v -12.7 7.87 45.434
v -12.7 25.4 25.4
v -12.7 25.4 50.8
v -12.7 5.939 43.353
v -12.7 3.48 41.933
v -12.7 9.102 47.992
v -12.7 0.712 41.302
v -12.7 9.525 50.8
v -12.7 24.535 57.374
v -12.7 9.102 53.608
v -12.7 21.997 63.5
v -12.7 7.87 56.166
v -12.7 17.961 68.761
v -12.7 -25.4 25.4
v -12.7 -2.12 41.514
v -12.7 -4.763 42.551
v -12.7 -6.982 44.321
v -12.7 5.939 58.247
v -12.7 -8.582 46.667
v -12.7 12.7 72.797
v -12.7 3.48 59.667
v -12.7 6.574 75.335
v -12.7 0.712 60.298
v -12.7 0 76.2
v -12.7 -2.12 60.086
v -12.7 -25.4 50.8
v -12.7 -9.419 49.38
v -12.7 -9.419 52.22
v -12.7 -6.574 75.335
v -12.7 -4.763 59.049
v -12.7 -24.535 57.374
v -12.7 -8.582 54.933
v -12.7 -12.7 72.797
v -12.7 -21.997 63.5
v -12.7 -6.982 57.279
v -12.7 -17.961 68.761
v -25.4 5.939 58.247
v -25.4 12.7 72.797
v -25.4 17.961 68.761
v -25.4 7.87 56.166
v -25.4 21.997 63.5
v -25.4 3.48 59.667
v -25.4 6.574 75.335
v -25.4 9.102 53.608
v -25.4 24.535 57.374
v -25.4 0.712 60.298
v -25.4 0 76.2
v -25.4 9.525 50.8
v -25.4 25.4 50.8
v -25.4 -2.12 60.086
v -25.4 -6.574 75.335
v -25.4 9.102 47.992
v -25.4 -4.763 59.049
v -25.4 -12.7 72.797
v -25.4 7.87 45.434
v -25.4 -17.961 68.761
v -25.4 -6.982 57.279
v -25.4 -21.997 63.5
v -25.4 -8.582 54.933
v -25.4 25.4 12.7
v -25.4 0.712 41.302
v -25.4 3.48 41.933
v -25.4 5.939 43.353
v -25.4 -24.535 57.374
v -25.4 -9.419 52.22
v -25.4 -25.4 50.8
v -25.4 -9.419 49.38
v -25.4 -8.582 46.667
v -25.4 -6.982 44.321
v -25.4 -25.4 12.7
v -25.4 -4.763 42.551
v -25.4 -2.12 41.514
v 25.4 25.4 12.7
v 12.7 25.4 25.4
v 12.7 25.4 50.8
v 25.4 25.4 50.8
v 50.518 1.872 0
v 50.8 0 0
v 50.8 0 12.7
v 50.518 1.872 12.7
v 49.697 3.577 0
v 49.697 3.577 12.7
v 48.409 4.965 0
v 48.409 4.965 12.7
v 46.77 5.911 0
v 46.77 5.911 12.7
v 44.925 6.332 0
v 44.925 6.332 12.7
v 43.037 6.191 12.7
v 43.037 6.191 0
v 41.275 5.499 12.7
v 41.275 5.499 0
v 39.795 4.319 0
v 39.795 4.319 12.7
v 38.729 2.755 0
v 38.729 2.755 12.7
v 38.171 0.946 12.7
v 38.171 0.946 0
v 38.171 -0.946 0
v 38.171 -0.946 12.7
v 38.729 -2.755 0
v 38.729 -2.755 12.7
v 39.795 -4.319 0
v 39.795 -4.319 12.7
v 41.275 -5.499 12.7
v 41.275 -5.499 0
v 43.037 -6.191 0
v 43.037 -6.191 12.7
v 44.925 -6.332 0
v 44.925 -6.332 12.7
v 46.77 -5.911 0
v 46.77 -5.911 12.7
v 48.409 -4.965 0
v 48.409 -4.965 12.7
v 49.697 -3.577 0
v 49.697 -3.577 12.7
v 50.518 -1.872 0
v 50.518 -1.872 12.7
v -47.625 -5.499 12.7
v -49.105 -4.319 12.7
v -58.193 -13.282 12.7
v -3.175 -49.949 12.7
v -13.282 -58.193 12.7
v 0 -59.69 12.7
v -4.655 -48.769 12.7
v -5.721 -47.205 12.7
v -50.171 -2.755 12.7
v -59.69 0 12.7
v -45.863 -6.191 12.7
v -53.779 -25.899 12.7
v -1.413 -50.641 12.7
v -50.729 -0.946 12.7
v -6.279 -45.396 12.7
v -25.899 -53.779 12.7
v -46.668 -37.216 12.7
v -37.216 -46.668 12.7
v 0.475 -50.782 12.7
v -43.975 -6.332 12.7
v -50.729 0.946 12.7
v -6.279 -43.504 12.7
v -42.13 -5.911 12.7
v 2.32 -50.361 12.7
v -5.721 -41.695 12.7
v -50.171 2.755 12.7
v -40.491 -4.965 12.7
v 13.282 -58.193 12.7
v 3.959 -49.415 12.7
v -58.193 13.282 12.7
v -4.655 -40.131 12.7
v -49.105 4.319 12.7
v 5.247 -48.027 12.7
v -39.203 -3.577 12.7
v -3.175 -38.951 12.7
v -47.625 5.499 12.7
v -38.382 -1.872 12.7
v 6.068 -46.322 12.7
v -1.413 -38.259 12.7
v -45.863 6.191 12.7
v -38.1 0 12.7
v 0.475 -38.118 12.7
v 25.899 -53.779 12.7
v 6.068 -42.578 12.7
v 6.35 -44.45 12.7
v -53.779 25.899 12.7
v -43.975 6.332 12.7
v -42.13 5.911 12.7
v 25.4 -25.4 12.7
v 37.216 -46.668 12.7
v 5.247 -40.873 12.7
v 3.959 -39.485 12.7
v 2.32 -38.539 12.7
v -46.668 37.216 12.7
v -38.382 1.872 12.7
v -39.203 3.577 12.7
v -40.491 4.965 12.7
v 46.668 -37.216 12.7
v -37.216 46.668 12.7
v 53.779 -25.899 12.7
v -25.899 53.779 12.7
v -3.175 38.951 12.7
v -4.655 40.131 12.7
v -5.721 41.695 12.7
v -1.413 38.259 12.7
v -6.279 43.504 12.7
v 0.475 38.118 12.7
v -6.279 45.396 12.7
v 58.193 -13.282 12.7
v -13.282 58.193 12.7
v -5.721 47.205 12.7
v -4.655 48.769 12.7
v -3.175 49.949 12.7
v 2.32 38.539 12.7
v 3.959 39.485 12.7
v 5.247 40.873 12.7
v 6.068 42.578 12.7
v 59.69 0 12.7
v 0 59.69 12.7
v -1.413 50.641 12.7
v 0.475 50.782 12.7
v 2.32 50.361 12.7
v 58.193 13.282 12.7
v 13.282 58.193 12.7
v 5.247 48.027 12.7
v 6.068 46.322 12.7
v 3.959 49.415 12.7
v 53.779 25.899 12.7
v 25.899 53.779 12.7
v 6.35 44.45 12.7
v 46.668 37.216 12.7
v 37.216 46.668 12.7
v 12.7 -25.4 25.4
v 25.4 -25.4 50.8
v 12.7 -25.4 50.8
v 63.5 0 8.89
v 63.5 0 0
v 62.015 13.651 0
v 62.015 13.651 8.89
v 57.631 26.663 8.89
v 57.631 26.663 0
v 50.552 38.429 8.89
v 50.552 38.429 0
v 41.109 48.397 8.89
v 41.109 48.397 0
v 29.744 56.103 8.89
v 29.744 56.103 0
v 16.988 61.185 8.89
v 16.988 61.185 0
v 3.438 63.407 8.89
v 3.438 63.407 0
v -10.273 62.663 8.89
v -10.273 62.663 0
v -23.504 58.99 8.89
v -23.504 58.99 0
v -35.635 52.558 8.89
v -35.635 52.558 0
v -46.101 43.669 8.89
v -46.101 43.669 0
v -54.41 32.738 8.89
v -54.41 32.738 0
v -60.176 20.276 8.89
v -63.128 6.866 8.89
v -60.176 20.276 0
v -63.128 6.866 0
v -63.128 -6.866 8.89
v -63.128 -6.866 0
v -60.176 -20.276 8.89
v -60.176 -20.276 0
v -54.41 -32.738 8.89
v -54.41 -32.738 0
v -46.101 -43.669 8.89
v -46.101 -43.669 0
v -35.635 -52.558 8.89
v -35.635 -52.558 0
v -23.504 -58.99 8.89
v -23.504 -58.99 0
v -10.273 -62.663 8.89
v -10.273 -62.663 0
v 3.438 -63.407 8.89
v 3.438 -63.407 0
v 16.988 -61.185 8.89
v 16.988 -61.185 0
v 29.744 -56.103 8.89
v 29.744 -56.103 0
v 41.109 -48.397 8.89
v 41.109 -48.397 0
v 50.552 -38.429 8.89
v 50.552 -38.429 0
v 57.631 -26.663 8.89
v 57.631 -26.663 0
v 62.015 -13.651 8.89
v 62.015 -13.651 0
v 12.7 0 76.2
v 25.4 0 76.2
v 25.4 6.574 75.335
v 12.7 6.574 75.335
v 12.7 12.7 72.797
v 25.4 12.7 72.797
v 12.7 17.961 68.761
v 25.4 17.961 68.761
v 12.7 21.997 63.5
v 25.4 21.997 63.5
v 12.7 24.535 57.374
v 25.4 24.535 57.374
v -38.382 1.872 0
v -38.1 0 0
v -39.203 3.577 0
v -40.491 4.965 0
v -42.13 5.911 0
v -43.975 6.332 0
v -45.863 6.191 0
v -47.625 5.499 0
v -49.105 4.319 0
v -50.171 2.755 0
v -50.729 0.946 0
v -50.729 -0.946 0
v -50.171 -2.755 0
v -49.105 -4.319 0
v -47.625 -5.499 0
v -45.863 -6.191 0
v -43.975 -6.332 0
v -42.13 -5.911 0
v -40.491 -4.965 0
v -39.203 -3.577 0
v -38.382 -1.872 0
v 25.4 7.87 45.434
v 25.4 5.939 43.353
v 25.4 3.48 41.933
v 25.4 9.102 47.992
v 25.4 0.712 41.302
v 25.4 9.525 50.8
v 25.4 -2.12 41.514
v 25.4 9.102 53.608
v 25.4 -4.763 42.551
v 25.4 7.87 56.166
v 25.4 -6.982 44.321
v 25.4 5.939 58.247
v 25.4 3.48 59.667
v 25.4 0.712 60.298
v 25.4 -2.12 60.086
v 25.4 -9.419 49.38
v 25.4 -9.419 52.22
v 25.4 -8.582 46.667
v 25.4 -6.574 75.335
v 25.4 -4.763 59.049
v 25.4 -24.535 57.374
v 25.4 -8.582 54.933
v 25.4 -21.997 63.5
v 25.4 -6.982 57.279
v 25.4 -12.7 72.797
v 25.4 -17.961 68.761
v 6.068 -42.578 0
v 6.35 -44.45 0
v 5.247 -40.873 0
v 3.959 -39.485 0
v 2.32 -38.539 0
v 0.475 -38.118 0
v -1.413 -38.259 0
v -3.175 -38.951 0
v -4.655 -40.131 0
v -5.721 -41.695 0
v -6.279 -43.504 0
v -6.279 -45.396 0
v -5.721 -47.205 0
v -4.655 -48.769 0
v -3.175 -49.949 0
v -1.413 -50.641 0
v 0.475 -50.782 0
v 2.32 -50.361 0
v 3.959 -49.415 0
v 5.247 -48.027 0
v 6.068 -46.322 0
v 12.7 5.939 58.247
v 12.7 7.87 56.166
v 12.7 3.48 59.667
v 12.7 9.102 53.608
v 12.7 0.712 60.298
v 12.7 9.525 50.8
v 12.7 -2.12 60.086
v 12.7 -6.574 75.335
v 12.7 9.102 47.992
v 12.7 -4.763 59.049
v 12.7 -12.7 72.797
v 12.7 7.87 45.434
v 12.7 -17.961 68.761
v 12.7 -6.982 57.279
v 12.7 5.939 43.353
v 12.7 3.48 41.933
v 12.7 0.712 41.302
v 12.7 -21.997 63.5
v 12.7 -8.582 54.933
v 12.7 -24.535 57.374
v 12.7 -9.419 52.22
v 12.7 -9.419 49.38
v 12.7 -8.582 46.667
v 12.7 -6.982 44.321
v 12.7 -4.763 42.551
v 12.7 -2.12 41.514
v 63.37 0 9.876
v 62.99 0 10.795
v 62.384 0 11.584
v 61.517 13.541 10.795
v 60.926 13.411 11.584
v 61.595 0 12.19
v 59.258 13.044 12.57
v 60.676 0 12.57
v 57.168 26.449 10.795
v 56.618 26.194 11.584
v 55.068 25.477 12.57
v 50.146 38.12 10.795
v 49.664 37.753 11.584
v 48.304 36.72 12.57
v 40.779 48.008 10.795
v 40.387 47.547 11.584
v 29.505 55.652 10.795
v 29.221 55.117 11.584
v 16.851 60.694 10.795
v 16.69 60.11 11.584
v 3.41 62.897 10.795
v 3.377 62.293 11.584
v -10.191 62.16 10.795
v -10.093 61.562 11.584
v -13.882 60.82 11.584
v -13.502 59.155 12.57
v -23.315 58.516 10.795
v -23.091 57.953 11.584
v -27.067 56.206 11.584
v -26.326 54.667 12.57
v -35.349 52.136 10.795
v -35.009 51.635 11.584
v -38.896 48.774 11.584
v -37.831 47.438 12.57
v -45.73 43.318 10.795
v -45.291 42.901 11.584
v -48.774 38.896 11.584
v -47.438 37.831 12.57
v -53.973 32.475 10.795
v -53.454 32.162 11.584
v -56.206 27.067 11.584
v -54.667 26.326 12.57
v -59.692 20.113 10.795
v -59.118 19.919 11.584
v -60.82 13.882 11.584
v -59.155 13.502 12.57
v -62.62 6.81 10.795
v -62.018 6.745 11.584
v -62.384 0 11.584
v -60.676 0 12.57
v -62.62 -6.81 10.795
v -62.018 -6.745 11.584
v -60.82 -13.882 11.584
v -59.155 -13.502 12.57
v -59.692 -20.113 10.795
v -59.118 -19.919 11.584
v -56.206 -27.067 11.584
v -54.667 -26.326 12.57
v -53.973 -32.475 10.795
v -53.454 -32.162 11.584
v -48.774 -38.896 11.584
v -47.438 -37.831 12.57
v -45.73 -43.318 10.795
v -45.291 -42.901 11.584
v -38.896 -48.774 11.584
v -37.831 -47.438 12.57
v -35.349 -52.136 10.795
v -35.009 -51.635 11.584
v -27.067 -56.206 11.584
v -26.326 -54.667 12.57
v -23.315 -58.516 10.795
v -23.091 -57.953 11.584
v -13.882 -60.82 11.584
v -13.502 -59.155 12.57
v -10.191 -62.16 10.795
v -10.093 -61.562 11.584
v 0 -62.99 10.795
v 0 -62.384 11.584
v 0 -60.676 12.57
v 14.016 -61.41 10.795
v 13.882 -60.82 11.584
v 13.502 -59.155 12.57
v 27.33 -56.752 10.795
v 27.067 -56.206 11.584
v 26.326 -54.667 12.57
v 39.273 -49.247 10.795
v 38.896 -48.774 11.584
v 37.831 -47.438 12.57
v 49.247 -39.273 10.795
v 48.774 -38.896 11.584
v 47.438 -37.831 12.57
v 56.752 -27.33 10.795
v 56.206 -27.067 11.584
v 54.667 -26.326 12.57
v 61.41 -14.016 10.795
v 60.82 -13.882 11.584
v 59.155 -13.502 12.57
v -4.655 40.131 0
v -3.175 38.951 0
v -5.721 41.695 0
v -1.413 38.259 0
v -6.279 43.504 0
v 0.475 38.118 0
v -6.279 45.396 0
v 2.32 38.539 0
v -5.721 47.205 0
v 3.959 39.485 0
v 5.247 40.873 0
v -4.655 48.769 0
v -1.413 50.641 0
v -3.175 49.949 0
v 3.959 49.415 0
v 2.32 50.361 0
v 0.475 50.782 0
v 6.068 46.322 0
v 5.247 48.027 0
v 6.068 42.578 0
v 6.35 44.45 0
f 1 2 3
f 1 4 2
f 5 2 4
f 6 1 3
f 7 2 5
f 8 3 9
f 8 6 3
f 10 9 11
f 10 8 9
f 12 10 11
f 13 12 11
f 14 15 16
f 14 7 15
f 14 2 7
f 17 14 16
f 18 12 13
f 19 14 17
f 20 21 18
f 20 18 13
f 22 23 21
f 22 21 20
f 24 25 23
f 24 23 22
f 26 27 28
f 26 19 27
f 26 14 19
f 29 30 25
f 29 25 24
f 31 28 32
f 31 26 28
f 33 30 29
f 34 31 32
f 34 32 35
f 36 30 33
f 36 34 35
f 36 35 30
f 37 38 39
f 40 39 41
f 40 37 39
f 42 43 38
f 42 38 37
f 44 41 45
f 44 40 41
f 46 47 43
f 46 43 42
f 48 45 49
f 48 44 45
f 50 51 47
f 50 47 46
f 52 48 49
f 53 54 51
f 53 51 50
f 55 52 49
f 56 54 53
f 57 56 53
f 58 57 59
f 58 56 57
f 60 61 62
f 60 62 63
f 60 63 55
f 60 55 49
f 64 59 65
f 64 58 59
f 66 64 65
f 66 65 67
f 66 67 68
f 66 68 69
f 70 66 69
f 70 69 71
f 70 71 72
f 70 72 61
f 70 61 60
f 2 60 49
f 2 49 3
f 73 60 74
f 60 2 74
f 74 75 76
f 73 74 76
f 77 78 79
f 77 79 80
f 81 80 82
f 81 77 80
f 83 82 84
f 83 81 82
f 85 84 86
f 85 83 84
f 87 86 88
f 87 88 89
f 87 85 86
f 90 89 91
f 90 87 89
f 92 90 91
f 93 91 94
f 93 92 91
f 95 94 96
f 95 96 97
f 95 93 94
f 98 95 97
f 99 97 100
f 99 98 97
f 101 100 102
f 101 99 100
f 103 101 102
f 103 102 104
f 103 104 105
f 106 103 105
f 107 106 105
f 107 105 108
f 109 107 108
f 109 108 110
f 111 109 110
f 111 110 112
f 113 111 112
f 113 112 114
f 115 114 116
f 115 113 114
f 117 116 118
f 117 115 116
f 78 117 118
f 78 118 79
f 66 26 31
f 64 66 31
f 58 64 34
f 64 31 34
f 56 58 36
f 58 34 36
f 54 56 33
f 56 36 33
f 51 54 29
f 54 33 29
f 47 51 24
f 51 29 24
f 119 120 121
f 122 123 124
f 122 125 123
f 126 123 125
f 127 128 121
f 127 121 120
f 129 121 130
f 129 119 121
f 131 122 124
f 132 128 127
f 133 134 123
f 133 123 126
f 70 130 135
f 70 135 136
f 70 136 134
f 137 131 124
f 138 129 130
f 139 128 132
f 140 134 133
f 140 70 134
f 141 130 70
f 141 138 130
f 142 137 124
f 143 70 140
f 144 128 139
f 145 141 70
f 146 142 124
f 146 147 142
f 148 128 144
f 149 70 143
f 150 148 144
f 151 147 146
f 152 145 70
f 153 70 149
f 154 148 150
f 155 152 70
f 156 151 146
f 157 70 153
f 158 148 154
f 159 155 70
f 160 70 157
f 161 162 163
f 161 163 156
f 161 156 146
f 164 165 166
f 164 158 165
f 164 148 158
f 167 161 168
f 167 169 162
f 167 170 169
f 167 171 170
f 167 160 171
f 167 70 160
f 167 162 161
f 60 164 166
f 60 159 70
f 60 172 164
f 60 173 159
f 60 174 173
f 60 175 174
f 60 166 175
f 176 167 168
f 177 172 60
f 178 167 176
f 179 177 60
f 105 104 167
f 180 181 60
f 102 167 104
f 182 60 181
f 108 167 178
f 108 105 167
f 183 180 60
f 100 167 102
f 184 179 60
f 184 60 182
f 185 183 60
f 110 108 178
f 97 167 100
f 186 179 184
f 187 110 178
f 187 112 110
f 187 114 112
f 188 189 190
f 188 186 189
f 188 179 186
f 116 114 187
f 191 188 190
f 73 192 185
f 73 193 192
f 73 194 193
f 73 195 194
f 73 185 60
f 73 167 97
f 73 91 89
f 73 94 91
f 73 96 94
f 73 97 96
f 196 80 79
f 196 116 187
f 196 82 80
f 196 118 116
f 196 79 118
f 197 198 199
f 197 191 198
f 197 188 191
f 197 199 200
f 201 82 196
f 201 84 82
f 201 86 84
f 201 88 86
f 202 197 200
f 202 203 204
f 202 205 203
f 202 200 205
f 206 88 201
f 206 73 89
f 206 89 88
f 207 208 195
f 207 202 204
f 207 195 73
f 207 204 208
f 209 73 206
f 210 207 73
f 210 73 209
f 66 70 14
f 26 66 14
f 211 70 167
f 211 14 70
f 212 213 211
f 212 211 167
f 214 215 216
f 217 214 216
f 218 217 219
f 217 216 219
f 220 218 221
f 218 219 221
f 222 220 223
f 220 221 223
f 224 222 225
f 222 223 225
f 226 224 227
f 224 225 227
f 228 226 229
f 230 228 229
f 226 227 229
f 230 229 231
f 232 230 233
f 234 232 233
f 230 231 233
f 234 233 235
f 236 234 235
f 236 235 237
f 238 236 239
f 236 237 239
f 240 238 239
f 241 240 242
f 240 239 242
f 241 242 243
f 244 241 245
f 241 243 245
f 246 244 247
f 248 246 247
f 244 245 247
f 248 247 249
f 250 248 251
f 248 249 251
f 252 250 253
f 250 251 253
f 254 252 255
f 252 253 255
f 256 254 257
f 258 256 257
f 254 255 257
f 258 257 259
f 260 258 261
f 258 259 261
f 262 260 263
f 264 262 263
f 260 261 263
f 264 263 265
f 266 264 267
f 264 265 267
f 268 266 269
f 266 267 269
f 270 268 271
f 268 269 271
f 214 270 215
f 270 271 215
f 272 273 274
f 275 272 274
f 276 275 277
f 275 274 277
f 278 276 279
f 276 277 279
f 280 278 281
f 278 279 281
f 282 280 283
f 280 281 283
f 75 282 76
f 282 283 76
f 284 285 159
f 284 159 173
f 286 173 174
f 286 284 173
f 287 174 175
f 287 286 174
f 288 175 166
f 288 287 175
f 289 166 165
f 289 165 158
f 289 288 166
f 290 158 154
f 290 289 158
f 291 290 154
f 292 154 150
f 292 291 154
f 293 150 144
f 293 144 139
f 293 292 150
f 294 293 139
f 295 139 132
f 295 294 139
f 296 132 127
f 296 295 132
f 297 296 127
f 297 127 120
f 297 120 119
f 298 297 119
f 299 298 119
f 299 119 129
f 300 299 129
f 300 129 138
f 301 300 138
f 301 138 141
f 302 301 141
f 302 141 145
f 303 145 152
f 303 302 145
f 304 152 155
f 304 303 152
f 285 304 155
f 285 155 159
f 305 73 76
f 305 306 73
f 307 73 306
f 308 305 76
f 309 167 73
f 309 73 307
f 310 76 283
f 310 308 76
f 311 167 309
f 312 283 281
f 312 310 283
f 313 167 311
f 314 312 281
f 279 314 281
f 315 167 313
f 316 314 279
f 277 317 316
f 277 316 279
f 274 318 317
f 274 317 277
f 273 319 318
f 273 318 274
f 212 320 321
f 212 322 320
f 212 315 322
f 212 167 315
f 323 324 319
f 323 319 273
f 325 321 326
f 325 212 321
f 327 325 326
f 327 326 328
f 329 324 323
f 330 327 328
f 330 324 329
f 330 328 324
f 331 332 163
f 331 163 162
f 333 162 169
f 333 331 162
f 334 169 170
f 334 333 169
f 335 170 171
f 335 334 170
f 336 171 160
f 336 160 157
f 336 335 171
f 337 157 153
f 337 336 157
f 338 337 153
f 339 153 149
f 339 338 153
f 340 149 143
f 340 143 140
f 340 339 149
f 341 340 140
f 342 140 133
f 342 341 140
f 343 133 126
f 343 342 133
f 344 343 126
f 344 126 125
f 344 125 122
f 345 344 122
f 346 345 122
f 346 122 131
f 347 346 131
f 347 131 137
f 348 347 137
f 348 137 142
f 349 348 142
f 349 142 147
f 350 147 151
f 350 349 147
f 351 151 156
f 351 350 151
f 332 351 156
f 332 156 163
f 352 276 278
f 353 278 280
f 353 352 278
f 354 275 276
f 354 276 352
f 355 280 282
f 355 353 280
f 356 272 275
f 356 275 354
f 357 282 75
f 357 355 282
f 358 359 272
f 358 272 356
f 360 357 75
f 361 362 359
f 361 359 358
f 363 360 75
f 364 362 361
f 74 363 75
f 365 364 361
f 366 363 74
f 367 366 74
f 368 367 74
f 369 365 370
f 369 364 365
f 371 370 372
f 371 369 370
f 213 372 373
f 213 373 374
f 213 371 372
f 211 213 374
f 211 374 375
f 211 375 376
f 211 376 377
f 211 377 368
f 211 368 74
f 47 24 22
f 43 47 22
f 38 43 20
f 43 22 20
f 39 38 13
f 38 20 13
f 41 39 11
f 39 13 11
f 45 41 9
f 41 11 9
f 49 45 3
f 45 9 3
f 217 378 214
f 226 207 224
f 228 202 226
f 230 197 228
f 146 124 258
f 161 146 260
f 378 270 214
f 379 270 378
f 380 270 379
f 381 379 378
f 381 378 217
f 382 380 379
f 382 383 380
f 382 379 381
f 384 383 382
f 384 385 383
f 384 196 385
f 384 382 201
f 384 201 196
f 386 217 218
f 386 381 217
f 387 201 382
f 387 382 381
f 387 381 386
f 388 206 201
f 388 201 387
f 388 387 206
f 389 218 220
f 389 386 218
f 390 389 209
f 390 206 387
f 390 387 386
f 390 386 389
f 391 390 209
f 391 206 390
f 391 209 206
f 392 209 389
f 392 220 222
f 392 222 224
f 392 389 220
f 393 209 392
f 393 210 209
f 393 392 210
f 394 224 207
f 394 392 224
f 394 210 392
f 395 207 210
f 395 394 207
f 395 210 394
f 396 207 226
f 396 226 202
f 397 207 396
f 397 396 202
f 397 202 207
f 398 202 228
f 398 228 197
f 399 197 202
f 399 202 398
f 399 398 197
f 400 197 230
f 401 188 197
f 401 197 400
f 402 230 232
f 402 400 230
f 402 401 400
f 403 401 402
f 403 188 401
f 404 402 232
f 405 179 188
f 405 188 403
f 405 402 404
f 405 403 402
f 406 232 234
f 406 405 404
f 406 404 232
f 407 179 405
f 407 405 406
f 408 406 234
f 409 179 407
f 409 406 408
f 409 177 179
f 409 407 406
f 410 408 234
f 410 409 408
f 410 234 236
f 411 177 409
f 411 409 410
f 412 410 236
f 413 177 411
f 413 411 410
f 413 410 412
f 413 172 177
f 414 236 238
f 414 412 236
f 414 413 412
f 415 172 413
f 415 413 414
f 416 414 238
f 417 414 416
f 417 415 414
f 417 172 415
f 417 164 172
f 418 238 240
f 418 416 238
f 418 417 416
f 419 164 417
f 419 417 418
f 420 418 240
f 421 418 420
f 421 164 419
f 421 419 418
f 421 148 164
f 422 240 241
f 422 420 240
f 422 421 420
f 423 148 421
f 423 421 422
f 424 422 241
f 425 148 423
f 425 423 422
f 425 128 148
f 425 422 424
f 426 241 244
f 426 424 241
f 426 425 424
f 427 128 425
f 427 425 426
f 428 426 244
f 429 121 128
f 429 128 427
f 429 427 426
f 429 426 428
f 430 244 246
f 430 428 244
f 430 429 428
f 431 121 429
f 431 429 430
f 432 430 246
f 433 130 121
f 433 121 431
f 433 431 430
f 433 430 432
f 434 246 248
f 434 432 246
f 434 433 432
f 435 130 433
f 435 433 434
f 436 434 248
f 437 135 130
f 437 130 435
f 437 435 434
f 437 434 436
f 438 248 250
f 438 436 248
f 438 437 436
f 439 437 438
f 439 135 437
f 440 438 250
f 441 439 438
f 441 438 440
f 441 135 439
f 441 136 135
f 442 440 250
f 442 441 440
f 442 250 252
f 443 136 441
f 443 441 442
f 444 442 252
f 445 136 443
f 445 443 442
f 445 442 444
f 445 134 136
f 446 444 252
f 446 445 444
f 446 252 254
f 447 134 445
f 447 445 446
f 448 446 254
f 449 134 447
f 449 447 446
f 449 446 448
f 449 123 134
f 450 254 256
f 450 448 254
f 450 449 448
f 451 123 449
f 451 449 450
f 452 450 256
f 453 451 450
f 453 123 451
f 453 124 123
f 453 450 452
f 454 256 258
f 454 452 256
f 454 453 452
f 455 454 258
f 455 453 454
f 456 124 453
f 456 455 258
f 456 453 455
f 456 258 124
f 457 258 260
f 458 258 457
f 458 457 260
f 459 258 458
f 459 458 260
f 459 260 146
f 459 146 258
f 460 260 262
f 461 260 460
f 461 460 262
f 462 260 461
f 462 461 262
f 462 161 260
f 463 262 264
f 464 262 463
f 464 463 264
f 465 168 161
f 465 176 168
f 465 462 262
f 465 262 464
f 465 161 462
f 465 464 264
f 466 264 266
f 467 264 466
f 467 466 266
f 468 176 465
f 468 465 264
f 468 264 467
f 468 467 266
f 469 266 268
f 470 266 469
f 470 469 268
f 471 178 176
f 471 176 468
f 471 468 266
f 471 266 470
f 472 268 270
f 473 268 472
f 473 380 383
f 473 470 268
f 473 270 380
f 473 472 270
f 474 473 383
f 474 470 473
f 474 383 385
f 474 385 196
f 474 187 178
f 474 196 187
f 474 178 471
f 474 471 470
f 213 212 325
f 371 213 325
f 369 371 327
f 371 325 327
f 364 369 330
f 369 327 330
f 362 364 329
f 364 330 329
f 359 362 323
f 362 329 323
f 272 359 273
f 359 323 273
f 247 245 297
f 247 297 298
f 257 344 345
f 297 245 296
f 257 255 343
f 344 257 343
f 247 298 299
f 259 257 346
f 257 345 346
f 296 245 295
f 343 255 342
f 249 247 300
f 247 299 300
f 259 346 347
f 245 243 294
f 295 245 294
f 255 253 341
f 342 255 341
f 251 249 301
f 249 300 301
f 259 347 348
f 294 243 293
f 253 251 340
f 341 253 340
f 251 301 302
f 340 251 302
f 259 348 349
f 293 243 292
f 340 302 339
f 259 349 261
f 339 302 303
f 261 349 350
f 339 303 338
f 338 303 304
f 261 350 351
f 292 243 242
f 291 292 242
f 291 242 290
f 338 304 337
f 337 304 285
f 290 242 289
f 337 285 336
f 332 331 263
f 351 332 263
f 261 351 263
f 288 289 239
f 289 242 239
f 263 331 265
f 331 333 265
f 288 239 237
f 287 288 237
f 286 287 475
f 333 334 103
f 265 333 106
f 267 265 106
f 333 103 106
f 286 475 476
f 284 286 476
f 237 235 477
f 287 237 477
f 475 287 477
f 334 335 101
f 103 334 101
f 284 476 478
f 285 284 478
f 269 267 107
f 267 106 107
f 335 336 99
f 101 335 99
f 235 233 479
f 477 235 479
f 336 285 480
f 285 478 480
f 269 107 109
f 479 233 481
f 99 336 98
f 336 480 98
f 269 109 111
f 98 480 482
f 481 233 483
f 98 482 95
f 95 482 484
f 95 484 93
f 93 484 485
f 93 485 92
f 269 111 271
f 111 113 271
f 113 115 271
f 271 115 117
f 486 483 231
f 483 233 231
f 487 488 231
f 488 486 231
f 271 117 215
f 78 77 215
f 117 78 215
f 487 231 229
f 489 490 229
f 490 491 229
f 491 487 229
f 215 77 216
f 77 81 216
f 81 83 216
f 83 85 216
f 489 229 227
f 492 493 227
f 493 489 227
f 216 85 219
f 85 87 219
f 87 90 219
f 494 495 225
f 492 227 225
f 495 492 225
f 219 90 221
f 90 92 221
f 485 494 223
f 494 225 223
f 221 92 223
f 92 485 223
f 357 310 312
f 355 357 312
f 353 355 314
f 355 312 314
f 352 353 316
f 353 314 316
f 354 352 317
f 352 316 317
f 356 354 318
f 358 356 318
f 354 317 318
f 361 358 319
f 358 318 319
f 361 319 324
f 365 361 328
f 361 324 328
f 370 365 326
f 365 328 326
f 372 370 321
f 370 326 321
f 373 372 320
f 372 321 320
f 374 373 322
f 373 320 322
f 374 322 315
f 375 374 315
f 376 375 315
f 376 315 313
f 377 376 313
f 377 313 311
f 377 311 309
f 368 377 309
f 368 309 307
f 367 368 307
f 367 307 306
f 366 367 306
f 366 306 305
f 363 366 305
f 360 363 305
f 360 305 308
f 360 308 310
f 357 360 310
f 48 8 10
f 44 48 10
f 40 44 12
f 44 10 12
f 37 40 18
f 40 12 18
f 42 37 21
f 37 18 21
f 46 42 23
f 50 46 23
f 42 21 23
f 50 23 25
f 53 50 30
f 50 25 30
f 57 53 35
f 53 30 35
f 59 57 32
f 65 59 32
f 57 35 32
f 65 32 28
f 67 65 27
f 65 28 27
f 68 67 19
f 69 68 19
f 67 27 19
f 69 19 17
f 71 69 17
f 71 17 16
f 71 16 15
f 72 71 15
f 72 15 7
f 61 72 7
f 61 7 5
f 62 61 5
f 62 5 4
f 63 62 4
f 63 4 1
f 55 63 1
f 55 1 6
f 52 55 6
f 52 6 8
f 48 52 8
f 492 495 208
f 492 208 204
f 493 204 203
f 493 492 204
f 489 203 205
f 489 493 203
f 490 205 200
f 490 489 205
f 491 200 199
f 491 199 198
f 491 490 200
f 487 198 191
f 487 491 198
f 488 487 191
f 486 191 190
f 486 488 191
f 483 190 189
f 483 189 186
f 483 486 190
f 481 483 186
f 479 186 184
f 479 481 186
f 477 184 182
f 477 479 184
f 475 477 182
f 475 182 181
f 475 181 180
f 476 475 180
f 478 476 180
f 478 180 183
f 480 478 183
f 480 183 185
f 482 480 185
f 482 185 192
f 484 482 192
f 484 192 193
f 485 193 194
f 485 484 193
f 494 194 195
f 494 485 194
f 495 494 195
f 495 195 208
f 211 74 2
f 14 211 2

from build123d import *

# Parameters (mm, degrees)
F0_R     = 63.5
F0_R_2   = 6.35
F1_DEPTH = 12.7
F2_R     = 3.81
F4_DEPTH = 25.4
F5_R     = 9.525
F6_DEPTH = 88.901


with BuildPart() as f1:
    # F0 (on Top) → F1 (new body)
    with BuildSketch(Plane.XY):
        Circle(F0_R)
        with Locations((0, -44.45)):
            Circle(F0_R_2, mode=Mode.SUBTRACT)
        with Locations((-44.45, 0)):
            Circle(F0_R_2, mode=Mode.SUBTRACT)
        with Locations((44.45, 0)):
            Circle(F0_R_2, mode=Mode.SUBTRACT)
        with Locations((0, 44.45)):
            Circle(F0_R_2, mode=Mode.SUBTRACT)
    extrude(amount=F1_DEPTH)

    # F2
    f2_edges = [f1.edges().sort_by_distance(p)[0] for p in [
        (-63.5, 0, 12.7),
    ]]
    fillet(f2_edges, radius=F2_R)

    # F3 (on Front) → F4 (join, symmetric)
    with BuildSketch(Plane.XZ):
        Polygon((-25.4, 76.2), (-25.4, 12.7), (25.4, 12.7), (25.4, 76.2), (12.7, 76.2), (12.7, 25.4), (-12.7, 25.4), (-12.7, 76.2), align=None)
    extrude(amount=F4_DEPTH, both=True)

    # F5 (on face) → F6 (cut, through all)
    with BuildSketch(Plane.YZ.offset(25.4)):
        with Locations((0, 50.8)):
            Circle(F5_R)
        with BuildLine():
            ThreePointArc((0, 76.2), (17.960512, 68.760512), (25.4, 50.8))
            Line((25.4, 50.8), (25.4, 76.2))
            Line((25.4, 76.2), (0, 76.2))
        make_face()
        with BuildLine():
            ThreePointArc((-25.4, 50.8), (-17.960512, 68.760512), (0, 76.2))
            Line((0, 76.2), (-25.4, 76.2))
            Line((-25.4, 76.2), (-25.4, 50.8))
        make_face()
    extrude(amount=-F6_DEPTH, mode=Mode.SUBTRACT)


solid = f1.part
